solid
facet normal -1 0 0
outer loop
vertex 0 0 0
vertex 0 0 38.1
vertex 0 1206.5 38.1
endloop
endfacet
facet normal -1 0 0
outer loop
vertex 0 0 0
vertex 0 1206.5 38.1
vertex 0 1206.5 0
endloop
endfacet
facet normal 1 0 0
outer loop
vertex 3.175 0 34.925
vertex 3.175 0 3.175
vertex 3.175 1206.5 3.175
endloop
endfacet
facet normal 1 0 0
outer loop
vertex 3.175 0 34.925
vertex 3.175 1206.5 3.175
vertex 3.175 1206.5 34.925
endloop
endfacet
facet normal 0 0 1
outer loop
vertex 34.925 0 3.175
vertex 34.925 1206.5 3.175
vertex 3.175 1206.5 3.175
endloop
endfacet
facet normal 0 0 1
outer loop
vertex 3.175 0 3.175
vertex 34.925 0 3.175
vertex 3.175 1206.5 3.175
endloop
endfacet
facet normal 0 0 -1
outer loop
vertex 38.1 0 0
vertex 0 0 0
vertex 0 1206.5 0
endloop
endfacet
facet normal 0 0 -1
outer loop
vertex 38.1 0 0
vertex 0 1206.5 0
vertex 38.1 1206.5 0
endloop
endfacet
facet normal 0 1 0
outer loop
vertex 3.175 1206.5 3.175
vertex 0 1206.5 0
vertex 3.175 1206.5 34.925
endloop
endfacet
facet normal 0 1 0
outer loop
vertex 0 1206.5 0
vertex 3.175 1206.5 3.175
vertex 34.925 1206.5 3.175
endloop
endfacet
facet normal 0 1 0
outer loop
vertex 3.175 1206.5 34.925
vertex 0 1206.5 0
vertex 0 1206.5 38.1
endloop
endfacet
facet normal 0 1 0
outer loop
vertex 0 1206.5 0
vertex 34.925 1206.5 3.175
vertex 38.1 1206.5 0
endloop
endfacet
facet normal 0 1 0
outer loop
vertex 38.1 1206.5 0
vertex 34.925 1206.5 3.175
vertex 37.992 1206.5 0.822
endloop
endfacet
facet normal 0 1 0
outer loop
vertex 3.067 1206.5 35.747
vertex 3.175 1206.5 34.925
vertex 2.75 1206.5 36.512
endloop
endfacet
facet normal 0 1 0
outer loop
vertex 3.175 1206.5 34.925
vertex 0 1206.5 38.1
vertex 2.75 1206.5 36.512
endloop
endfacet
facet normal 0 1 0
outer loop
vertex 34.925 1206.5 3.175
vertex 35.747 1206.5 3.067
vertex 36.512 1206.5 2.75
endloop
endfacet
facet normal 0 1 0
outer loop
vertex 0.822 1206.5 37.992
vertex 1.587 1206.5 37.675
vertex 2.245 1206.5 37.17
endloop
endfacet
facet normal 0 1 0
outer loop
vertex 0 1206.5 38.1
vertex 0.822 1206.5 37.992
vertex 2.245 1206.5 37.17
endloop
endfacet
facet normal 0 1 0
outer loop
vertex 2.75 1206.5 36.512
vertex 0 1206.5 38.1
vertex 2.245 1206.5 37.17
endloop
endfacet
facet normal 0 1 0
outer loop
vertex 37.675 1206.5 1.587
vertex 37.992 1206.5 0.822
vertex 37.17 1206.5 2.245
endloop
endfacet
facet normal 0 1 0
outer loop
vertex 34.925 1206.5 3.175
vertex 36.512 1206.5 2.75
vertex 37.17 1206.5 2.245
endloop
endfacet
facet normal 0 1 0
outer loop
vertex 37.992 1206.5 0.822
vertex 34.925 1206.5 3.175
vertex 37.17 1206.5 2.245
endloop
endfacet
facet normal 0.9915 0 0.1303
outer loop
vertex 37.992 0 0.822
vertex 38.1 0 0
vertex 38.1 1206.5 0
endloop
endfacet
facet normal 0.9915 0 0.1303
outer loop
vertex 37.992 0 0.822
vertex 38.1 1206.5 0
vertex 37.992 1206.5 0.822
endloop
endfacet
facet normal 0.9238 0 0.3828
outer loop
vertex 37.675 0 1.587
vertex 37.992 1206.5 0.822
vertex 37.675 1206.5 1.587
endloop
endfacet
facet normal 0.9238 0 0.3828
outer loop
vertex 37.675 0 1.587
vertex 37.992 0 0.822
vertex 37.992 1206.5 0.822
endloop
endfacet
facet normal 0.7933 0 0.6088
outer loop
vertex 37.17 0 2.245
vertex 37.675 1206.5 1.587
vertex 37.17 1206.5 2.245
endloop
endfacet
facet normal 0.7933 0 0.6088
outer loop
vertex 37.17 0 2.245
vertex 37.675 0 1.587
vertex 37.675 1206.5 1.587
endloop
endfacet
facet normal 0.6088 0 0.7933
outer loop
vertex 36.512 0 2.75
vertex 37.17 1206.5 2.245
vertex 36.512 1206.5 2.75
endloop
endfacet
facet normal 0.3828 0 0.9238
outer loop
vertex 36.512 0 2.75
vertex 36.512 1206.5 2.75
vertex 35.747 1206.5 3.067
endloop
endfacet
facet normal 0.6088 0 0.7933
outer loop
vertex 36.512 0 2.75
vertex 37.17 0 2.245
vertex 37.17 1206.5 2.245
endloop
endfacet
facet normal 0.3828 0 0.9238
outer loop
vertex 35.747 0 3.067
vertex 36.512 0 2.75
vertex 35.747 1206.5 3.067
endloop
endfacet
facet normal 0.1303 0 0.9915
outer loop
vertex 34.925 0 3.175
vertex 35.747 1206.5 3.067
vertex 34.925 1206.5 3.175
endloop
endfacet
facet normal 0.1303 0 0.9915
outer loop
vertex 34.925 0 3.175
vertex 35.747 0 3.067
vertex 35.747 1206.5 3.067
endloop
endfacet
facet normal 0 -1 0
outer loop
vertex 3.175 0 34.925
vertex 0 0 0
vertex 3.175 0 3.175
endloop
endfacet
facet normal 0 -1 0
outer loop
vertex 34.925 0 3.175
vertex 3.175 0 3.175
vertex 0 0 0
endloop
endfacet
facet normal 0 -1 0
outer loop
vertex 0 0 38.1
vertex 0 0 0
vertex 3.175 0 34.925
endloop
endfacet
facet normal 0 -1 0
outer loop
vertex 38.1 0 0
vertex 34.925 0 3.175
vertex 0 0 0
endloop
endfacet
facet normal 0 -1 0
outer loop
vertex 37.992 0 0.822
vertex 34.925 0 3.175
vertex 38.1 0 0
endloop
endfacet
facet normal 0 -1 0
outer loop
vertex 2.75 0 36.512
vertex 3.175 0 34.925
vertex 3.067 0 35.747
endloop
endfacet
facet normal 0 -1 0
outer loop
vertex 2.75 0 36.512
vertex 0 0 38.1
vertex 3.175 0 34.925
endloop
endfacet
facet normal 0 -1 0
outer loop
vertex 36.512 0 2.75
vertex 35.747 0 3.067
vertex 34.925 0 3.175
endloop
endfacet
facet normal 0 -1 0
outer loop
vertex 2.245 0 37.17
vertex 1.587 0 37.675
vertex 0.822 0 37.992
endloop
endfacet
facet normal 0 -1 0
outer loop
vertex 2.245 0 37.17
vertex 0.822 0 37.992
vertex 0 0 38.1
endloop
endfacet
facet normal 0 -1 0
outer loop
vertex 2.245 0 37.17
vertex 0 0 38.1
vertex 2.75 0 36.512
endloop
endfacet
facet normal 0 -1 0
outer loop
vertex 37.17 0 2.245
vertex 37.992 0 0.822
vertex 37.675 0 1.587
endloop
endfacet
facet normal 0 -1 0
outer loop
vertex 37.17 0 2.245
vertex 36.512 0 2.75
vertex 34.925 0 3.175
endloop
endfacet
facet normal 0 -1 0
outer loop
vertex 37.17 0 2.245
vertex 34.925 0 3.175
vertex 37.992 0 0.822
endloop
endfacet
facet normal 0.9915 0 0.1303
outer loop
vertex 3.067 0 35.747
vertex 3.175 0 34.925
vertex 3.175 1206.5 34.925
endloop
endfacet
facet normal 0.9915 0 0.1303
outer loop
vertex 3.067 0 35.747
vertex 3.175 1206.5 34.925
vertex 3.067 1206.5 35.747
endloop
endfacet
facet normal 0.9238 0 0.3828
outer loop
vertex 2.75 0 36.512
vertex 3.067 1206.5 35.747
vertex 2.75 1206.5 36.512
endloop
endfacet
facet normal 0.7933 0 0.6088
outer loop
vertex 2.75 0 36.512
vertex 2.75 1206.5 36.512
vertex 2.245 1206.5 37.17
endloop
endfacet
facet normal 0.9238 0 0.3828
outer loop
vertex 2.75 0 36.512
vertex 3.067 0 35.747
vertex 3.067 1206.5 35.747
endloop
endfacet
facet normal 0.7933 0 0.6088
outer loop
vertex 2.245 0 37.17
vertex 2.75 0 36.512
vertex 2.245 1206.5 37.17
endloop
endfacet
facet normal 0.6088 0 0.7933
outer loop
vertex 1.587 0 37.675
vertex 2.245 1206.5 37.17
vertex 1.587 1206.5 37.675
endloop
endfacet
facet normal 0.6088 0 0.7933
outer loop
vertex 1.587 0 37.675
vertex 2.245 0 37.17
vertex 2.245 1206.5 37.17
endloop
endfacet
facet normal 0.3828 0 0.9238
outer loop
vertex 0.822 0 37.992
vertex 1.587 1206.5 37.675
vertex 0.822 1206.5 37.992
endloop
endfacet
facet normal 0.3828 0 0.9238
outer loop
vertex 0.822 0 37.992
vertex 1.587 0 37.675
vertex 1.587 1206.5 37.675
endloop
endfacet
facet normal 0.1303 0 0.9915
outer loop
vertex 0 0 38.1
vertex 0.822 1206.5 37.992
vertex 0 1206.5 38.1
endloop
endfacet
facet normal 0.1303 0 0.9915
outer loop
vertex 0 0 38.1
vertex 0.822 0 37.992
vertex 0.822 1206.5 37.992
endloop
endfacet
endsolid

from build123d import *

# Parameters (mm, degrees)
F1_DEPTH = 1206.5


with BuildPart() as f1:
    # F0 (on Front) → F1 (new body)
    with BuildSketch(Plane.XZ):
        with BuildLine():
            Line((0, 38.1), (0, 0))
            Line((0, 0), (38.1, 0))
            ThreePointArc((38.1, 0), (37.170064, 2.245064), (34.925, 3.175))
            Line((34.925, 3.175), (3.175, 3.175))
            Line((3.175, 3.175), (3.175, 34.925))
            ThreePointArc((3.175, 34.925), (2.245064, 37.170064), (0, 38.1))
        make_face()
    extrude(amount=-F1_DEPTH)


solid = f1.part
